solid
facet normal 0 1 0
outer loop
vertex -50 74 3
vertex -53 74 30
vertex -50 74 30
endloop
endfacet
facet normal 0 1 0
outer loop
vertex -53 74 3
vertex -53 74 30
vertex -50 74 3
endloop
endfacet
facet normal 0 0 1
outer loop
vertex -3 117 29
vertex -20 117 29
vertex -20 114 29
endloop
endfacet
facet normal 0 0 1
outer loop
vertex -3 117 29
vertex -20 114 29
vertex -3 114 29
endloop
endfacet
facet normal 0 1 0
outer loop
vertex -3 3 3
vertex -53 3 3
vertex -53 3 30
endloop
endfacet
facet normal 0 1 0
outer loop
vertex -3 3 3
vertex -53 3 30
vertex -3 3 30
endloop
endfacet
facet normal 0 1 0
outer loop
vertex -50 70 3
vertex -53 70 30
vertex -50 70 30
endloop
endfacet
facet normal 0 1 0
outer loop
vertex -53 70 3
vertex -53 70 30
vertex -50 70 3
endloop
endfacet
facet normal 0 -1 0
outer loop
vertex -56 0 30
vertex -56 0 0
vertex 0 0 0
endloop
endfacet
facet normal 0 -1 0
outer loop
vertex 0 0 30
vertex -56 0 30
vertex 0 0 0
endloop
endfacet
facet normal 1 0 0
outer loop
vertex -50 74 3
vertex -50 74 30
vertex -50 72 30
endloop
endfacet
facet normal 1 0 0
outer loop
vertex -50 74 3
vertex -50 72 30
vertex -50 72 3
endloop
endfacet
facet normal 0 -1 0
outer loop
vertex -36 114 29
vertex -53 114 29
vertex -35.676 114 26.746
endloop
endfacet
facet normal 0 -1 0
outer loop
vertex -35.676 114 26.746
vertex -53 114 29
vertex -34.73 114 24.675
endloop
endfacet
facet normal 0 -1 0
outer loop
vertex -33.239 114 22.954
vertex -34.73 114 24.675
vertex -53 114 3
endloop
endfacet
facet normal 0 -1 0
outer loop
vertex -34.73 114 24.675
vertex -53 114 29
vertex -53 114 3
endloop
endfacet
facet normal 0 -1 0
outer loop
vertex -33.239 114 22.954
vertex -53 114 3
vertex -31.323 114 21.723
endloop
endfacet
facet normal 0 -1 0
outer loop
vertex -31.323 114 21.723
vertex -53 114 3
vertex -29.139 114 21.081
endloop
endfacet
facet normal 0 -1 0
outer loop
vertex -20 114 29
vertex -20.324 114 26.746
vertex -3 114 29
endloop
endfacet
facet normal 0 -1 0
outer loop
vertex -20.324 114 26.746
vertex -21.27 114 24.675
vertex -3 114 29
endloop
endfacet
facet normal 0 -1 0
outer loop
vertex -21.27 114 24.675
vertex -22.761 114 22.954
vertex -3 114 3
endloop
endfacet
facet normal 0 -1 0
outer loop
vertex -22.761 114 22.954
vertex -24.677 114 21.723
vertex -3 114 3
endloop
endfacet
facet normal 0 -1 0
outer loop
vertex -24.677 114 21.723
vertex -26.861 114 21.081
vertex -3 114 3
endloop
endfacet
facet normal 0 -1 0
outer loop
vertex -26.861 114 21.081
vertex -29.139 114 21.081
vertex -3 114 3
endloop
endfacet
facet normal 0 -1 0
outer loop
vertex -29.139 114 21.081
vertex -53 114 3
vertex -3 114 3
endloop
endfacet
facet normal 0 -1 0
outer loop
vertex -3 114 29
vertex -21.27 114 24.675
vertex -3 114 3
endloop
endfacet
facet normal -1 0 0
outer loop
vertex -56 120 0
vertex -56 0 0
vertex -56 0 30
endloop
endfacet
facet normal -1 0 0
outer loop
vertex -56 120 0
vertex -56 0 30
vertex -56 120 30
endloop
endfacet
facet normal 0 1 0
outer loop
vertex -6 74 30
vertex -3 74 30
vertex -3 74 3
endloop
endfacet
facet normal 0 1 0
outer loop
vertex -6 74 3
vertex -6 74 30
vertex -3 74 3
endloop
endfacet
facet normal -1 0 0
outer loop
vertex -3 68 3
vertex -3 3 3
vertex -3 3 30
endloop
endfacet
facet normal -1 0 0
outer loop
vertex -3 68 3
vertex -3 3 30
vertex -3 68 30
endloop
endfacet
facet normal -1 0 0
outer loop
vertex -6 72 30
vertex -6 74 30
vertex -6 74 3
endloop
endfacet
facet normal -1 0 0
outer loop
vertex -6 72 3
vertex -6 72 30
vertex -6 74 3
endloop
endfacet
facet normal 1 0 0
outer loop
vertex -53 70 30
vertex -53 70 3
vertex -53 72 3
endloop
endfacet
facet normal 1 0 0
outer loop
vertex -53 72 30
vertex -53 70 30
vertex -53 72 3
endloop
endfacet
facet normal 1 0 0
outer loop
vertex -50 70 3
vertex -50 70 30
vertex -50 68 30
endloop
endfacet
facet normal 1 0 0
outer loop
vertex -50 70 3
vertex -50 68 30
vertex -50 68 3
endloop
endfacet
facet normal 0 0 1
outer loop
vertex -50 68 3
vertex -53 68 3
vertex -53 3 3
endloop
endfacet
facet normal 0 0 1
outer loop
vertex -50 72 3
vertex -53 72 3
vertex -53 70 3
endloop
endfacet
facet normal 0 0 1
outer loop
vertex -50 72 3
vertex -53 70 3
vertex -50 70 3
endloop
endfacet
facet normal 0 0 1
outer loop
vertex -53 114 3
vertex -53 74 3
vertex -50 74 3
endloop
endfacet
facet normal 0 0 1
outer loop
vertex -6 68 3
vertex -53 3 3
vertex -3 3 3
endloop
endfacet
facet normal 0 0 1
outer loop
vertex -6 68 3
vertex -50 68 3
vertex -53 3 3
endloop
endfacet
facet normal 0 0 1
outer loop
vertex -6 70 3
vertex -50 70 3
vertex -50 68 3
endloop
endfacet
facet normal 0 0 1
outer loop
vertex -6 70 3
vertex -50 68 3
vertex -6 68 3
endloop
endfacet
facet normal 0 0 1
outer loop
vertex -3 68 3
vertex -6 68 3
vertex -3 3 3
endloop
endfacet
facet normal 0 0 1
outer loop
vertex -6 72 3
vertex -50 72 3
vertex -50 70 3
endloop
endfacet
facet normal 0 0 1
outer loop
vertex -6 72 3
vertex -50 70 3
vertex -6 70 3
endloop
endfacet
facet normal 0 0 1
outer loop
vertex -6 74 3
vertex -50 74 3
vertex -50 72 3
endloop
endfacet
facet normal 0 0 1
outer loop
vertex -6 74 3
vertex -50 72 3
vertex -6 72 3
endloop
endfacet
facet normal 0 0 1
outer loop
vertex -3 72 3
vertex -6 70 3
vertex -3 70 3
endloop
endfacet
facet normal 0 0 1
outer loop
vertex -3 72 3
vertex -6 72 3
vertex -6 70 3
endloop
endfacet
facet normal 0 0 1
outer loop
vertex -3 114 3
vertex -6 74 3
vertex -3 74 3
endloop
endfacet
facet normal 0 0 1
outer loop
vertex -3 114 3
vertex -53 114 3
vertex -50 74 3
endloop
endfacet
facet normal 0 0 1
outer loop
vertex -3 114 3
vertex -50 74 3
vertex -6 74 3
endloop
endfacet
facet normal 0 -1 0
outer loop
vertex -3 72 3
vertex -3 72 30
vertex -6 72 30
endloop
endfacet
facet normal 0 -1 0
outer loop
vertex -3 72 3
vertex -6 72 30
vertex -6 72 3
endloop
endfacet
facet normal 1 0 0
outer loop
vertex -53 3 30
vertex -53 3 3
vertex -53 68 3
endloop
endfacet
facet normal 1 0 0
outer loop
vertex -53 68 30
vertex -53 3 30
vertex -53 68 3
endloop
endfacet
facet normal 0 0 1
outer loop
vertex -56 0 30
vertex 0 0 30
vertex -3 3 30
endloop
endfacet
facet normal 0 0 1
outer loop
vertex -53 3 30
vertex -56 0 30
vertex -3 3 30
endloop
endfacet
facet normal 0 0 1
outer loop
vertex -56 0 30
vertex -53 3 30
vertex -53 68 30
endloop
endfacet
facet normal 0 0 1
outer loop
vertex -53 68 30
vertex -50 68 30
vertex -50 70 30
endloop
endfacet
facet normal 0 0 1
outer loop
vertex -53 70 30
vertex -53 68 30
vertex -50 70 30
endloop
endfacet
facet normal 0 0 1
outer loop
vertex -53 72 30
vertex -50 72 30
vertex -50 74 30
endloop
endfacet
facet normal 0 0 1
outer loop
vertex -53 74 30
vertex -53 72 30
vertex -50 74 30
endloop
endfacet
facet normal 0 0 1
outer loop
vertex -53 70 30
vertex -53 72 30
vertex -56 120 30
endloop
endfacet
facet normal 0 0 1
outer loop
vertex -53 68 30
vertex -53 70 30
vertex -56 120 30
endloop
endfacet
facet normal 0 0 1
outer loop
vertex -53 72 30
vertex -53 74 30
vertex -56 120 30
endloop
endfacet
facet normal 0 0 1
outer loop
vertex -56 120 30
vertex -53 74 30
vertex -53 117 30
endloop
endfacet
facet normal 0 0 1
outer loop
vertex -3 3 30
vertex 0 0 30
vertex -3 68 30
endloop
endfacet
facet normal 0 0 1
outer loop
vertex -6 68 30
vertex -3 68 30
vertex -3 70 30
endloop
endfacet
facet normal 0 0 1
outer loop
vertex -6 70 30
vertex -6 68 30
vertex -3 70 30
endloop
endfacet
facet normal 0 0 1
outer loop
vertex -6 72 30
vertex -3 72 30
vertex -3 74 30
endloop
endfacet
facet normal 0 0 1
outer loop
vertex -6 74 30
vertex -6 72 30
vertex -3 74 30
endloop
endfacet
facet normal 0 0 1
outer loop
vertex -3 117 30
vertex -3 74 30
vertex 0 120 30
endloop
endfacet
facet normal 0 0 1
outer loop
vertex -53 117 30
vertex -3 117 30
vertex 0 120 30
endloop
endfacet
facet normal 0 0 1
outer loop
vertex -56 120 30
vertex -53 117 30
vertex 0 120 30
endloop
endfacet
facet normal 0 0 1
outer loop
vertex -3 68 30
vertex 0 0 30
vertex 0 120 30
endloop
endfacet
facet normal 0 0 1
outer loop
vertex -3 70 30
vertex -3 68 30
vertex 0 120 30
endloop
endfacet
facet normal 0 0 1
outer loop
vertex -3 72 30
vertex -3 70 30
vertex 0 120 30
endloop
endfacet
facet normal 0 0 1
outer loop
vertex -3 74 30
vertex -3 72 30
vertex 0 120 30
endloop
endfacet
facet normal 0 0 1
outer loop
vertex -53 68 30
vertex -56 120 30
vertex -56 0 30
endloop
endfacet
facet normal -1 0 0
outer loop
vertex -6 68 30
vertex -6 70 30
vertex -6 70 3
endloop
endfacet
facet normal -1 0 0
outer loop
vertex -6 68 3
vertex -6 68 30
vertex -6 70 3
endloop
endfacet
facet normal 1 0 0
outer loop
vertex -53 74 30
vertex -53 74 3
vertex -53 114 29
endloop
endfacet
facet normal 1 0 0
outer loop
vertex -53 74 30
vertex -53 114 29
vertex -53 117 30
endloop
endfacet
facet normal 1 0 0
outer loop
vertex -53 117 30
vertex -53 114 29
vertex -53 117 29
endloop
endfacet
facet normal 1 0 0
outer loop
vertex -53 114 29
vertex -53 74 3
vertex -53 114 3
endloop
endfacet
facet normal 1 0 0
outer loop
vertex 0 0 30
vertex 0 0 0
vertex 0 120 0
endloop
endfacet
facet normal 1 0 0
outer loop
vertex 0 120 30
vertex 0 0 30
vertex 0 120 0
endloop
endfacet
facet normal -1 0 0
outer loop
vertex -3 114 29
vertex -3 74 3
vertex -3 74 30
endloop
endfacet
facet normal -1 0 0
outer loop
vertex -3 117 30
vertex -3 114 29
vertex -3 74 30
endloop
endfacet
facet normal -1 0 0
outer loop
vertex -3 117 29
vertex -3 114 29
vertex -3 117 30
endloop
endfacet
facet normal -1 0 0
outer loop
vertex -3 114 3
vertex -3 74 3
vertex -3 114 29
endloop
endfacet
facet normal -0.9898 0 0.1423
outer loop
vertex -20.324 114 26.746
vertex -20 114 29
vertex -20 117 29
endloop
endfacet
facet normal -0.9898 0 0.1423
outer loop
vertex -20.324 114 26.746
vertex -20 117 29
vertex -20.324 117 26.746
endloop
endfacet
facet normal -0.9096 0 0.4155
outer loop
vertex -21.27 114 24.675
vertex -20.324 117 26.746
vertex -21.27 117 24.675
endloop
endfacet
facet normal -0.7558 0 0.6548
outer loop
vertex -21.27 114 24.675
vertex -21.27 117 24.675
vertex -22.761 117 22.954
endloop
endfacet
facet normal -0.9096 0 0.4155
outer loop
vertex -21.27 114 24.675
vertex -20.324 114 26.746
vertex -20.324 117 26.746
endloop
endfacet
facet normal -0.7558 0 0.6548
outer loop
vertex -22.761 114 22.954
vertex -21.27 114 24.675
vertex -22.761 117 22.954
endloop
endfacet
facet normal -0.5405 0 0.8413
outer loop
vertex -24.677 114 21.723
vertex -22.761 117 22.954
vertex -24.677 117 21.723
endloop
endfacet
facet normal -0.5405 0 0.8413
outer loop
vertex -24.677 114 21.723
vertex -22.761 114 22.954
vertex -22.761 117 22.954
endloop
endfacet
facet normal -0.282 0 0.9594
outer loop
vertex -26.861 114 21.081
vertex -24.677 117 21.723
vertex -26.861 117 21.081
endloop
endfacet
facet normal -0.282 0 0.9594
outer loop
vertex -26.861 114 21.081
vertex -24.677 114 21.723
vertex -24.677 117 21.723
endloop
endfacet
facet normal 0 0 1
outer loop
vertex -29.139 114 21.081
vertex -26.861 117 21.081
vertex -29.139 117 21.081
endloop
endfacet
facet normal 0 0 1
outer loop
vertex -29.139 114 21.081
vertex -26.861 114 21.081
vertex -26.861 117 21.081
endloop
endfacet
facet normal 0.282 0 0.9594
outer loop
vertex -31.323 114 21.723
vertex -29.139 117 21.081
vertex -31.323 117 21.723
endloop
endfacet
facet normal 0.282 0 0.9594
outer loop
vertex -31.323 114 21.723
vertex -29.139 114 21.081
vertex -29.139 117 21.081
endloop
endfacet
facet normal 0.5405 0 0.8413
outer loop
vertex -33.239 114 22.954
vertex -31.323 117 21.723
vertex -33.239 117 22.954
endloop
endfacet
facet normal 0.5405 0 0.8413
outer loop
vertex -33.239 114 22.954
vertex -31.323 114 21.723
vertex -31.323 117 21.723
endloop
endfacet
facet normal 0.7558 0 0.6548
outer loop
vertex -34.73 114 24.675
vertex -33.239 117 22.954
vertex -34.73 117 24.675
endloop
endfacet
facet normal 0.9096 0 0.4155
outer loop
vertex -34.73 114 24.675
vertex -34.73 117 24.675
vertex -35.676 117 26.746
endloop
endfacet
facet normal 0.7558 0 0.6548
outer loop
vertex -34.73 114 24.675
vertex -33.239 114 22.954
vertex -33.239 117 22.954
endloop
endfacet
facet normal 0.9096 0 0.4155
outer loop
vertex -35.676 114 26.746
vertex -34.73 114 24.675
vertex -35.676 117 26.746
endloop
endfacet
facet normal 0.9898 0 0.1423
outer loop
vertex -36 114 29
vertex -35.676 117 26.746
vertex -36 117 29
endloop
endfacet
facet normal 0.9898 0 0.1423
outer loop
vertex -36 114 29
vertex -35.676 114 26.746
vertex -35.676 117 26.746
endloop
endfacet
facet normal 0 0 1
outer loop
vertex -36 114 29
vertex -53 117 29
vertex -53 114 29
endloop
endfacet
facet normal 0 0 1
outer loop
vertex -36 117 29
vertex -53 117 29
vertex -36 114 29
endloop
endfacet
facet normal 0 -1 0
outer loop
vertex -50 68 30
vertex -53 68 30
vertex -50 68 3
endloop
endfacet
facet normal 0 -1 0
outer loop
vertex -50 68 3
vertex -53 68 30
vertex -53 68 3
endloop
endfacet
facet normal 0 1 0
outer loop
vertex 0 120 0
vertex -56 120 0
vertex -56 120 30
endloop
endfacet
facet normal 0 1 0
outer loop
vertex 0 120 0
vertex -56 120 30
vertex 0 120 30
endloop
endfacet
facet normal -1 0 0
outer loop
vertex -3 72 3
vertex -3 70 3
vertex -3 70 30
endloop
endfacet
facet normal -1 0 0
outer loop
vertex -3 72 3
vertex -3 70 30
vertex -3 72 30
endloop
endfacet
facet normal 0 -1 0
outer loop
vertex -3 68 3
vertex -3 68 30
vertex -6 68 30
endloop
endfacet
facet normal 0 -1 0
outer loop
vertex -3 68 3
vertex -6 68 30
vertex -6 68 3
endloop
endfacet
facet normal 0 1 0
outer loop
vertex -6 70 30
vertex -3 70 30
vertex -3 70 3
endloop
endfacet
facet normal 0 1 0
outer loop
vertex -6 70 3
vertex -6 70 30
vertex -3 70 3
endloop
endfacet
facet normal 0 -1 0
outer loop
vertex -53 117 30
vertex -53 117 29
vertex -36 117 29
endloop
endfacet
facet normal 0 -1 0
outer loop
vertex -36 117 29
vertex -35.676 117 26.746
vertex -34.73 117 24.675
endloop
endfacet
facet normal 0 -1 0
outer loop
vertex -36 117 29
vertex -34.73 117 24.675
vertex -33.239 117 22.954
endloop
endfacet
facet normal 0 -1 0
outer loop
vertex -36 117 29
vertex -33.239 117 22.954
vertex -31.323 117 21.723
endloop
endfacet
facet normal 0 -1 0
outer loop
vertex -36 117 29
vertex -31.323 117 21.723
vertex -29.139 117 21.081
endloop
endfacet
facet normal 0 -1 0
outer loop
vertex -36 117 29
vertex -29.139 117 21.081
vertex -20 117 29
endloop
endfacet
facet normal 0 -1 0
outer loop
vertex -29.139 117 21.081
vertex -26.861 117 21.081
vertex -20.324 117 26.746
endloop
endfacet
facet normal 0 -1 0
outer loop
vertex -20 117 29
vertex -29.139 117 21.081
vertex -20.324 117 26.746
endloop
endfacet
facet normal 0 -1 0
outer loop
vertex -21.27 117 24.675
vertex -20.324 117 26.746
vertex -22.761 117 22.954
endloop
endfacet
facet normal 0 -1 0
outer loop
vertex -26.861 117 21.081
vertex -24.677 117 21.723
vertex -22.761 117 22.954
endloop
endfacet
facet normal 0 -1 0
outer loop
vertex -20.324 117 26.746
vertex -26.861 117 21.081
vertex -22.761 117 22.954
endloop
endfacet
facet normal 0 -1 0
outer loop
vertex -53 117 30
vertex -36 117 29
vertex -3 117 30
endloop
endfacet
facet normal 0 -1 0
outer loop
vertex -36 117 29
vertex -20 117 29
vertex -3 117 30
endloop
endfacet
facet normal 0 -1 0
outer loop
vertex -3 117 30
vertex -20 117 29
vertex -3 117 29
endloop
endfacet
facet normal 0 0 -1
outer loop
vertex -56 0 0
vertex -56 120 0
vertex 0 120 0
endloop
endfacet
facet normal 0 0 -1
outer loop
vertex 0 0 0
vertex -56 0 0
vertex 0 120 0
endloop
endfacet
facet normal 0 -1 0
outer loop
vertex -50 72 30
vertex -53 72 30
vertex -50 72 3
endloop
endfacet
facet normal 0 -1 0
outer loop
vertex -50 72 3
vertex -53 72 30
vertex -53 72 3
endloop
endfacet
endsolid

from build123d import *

# Parameters (mm, degrees)
SKETCH1_W           = 56
SKETCH1_H           = 120
BOSS_EXTRUDE1_DEPTH = 30
SHELL1_T            = -3
SKETCH2_W           = 50
SKETCH2_H           = 3
BOSS_EXTRUDE2_DEPTH = 26
CUT_EXTRUDE5_DEPTH  = 3
SKETCH6_W           = 30
SKETCH6_H           = 2
BOSS_EXTRUDE3_DEPTH = 3
SKETCH7_W           = 30
SKETCH7_H           = 2
BOSS_EXTRUDE4_DEPTH = 3


with BuildPart() as part:
    # Sketch1 → Boss-Extrude1 (new body)
    with BuildSketch(Plane.XY):
        with Locations((-28, 60)):
            Rectangle(SKETCH1_W, SKETCH1_H)
    extrude(amount=BOSS_EXTRUDE1_DEPTH)

    # Shell1
    shell1_openings = [part.faces().sort_by_distance(p)[0] for p in [
        (-28, 60, 30),
    ]]
    offset(amount=SHELL1_T, openings=shell1_openings, kind=Kind.INTERSECTION)

    # Sketch2 → Boss-Extrude2 (add)
    with BuildSketch(Plane.XY.offset(3)):
        with Locations((-28, 115.5)):
            Rectangle(SKETCH2_W, SKETCH2_H)
    extrude(amount=BOSS_EXTRUDE2_DEPTH)

    # Sketch3 → Cut-Extrude5 (cut)
    with BuildSketch(Plane.XZ.offset(-114)):
        with BuildLine():
            Line((-36, 29), (-20, 29))
            ThreePointArc((-20, 29), (-28, 21), (-36, 29))
        make_face()
    extrude(amount=-CUT_EXTRUDE5_DEPTH, mode=Mode.SUBTRACT)

    # Sketch6 → Boss-Extrude3 (add)
    with BuildSketch(Plane(origin=(-53, 0, 0), x_dir=(0, 0, -1), z_dir=(1, 0, 0))):
        with Locations((-15, 73)):
            Rectangle(SKETCH6_W, SKETCH6_H)
    boss_extrude3 = extrude(amount=BOSS_EXTRUDE3_DEPTH)

    # Sketch7 → Boss-Extrude4 (add)
    with BuildSketch(Plane(origin=(-53, 0, 0), x_dir=(0, 0, -1), z_dir=(1, 0, 0))):
        with Locations((-15, 69)):
            Rectangle(SKETCH7_W, SKETCH7_H)
    boss_extrude4 = extrude(amount=BOSS_EXTRUDE4_DEPTH)

    # Mirror1: Boss-Extrude3, Boss-Extrude4 across plane
    add(boss_extrude3.mirror(Plane(origin=(-28, 0, 0), x_dir=(0, 0, 1), z_dir=(1, 0, 0))))
    add(boss_extrude4.mirror(Plane(origin=(-28, 0, 0), x_dir=(0, 0, 1), z_dir=(1, 0, 0))))


solid = part.part
